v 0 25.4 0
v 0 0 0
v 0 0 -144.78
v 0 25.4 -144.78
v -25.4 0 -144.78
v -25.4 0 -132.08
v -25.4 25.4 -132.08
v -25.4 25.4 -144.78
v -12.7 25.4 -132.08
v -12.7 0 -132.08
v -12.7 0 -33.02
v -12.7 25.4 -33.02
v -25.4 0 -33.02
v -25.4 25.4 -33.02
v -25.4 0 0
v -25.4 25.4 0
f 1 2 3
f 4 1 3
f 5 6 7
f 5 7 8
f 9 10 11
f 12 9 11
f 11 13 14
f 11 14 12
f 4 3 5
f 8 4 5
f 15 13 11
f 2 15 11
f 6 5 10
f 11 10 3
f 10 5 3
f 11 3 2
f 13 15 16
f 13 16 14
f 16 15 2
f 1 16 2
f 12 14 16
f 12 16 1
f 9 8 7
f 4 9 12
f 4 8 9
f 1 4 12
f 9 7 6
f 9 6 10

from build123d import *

# Parameters (mm, degrees)
SKETCH1_W           = 25.4
SKETCH1_H           = 33.02
SKETCH1_W_2         = 12.7
SKETCH1_H_2         = 12.7
BOSS_EXTRUDE1_DEPTH = 25.4


with BuildPart() as part:
    # Sketch1 → Boss-Extrude1 (new body)
    with BuildSketch(Plane(origin=(0, 0, 0), x_dir=(1, 0, 0), z_dir=(0, 1, 0))):
        with Locations((-12.7, 16.51)):
            Rectangle(SKETCH1_W, SKETCH1_H)
        Polygon((-12.7, 33.02), (0, 33.02), (0, 144.78), (-12.7, 144.78), (-12.7, 132.08), align=None)
        with Locations((-19.05, 138.43)):
            Rectangle(SKETCH1_W_2, SKETCH1_H_2)
    extrude(amount=BOSS_EXTRUDE1_DEPTH)


solid = part.part
